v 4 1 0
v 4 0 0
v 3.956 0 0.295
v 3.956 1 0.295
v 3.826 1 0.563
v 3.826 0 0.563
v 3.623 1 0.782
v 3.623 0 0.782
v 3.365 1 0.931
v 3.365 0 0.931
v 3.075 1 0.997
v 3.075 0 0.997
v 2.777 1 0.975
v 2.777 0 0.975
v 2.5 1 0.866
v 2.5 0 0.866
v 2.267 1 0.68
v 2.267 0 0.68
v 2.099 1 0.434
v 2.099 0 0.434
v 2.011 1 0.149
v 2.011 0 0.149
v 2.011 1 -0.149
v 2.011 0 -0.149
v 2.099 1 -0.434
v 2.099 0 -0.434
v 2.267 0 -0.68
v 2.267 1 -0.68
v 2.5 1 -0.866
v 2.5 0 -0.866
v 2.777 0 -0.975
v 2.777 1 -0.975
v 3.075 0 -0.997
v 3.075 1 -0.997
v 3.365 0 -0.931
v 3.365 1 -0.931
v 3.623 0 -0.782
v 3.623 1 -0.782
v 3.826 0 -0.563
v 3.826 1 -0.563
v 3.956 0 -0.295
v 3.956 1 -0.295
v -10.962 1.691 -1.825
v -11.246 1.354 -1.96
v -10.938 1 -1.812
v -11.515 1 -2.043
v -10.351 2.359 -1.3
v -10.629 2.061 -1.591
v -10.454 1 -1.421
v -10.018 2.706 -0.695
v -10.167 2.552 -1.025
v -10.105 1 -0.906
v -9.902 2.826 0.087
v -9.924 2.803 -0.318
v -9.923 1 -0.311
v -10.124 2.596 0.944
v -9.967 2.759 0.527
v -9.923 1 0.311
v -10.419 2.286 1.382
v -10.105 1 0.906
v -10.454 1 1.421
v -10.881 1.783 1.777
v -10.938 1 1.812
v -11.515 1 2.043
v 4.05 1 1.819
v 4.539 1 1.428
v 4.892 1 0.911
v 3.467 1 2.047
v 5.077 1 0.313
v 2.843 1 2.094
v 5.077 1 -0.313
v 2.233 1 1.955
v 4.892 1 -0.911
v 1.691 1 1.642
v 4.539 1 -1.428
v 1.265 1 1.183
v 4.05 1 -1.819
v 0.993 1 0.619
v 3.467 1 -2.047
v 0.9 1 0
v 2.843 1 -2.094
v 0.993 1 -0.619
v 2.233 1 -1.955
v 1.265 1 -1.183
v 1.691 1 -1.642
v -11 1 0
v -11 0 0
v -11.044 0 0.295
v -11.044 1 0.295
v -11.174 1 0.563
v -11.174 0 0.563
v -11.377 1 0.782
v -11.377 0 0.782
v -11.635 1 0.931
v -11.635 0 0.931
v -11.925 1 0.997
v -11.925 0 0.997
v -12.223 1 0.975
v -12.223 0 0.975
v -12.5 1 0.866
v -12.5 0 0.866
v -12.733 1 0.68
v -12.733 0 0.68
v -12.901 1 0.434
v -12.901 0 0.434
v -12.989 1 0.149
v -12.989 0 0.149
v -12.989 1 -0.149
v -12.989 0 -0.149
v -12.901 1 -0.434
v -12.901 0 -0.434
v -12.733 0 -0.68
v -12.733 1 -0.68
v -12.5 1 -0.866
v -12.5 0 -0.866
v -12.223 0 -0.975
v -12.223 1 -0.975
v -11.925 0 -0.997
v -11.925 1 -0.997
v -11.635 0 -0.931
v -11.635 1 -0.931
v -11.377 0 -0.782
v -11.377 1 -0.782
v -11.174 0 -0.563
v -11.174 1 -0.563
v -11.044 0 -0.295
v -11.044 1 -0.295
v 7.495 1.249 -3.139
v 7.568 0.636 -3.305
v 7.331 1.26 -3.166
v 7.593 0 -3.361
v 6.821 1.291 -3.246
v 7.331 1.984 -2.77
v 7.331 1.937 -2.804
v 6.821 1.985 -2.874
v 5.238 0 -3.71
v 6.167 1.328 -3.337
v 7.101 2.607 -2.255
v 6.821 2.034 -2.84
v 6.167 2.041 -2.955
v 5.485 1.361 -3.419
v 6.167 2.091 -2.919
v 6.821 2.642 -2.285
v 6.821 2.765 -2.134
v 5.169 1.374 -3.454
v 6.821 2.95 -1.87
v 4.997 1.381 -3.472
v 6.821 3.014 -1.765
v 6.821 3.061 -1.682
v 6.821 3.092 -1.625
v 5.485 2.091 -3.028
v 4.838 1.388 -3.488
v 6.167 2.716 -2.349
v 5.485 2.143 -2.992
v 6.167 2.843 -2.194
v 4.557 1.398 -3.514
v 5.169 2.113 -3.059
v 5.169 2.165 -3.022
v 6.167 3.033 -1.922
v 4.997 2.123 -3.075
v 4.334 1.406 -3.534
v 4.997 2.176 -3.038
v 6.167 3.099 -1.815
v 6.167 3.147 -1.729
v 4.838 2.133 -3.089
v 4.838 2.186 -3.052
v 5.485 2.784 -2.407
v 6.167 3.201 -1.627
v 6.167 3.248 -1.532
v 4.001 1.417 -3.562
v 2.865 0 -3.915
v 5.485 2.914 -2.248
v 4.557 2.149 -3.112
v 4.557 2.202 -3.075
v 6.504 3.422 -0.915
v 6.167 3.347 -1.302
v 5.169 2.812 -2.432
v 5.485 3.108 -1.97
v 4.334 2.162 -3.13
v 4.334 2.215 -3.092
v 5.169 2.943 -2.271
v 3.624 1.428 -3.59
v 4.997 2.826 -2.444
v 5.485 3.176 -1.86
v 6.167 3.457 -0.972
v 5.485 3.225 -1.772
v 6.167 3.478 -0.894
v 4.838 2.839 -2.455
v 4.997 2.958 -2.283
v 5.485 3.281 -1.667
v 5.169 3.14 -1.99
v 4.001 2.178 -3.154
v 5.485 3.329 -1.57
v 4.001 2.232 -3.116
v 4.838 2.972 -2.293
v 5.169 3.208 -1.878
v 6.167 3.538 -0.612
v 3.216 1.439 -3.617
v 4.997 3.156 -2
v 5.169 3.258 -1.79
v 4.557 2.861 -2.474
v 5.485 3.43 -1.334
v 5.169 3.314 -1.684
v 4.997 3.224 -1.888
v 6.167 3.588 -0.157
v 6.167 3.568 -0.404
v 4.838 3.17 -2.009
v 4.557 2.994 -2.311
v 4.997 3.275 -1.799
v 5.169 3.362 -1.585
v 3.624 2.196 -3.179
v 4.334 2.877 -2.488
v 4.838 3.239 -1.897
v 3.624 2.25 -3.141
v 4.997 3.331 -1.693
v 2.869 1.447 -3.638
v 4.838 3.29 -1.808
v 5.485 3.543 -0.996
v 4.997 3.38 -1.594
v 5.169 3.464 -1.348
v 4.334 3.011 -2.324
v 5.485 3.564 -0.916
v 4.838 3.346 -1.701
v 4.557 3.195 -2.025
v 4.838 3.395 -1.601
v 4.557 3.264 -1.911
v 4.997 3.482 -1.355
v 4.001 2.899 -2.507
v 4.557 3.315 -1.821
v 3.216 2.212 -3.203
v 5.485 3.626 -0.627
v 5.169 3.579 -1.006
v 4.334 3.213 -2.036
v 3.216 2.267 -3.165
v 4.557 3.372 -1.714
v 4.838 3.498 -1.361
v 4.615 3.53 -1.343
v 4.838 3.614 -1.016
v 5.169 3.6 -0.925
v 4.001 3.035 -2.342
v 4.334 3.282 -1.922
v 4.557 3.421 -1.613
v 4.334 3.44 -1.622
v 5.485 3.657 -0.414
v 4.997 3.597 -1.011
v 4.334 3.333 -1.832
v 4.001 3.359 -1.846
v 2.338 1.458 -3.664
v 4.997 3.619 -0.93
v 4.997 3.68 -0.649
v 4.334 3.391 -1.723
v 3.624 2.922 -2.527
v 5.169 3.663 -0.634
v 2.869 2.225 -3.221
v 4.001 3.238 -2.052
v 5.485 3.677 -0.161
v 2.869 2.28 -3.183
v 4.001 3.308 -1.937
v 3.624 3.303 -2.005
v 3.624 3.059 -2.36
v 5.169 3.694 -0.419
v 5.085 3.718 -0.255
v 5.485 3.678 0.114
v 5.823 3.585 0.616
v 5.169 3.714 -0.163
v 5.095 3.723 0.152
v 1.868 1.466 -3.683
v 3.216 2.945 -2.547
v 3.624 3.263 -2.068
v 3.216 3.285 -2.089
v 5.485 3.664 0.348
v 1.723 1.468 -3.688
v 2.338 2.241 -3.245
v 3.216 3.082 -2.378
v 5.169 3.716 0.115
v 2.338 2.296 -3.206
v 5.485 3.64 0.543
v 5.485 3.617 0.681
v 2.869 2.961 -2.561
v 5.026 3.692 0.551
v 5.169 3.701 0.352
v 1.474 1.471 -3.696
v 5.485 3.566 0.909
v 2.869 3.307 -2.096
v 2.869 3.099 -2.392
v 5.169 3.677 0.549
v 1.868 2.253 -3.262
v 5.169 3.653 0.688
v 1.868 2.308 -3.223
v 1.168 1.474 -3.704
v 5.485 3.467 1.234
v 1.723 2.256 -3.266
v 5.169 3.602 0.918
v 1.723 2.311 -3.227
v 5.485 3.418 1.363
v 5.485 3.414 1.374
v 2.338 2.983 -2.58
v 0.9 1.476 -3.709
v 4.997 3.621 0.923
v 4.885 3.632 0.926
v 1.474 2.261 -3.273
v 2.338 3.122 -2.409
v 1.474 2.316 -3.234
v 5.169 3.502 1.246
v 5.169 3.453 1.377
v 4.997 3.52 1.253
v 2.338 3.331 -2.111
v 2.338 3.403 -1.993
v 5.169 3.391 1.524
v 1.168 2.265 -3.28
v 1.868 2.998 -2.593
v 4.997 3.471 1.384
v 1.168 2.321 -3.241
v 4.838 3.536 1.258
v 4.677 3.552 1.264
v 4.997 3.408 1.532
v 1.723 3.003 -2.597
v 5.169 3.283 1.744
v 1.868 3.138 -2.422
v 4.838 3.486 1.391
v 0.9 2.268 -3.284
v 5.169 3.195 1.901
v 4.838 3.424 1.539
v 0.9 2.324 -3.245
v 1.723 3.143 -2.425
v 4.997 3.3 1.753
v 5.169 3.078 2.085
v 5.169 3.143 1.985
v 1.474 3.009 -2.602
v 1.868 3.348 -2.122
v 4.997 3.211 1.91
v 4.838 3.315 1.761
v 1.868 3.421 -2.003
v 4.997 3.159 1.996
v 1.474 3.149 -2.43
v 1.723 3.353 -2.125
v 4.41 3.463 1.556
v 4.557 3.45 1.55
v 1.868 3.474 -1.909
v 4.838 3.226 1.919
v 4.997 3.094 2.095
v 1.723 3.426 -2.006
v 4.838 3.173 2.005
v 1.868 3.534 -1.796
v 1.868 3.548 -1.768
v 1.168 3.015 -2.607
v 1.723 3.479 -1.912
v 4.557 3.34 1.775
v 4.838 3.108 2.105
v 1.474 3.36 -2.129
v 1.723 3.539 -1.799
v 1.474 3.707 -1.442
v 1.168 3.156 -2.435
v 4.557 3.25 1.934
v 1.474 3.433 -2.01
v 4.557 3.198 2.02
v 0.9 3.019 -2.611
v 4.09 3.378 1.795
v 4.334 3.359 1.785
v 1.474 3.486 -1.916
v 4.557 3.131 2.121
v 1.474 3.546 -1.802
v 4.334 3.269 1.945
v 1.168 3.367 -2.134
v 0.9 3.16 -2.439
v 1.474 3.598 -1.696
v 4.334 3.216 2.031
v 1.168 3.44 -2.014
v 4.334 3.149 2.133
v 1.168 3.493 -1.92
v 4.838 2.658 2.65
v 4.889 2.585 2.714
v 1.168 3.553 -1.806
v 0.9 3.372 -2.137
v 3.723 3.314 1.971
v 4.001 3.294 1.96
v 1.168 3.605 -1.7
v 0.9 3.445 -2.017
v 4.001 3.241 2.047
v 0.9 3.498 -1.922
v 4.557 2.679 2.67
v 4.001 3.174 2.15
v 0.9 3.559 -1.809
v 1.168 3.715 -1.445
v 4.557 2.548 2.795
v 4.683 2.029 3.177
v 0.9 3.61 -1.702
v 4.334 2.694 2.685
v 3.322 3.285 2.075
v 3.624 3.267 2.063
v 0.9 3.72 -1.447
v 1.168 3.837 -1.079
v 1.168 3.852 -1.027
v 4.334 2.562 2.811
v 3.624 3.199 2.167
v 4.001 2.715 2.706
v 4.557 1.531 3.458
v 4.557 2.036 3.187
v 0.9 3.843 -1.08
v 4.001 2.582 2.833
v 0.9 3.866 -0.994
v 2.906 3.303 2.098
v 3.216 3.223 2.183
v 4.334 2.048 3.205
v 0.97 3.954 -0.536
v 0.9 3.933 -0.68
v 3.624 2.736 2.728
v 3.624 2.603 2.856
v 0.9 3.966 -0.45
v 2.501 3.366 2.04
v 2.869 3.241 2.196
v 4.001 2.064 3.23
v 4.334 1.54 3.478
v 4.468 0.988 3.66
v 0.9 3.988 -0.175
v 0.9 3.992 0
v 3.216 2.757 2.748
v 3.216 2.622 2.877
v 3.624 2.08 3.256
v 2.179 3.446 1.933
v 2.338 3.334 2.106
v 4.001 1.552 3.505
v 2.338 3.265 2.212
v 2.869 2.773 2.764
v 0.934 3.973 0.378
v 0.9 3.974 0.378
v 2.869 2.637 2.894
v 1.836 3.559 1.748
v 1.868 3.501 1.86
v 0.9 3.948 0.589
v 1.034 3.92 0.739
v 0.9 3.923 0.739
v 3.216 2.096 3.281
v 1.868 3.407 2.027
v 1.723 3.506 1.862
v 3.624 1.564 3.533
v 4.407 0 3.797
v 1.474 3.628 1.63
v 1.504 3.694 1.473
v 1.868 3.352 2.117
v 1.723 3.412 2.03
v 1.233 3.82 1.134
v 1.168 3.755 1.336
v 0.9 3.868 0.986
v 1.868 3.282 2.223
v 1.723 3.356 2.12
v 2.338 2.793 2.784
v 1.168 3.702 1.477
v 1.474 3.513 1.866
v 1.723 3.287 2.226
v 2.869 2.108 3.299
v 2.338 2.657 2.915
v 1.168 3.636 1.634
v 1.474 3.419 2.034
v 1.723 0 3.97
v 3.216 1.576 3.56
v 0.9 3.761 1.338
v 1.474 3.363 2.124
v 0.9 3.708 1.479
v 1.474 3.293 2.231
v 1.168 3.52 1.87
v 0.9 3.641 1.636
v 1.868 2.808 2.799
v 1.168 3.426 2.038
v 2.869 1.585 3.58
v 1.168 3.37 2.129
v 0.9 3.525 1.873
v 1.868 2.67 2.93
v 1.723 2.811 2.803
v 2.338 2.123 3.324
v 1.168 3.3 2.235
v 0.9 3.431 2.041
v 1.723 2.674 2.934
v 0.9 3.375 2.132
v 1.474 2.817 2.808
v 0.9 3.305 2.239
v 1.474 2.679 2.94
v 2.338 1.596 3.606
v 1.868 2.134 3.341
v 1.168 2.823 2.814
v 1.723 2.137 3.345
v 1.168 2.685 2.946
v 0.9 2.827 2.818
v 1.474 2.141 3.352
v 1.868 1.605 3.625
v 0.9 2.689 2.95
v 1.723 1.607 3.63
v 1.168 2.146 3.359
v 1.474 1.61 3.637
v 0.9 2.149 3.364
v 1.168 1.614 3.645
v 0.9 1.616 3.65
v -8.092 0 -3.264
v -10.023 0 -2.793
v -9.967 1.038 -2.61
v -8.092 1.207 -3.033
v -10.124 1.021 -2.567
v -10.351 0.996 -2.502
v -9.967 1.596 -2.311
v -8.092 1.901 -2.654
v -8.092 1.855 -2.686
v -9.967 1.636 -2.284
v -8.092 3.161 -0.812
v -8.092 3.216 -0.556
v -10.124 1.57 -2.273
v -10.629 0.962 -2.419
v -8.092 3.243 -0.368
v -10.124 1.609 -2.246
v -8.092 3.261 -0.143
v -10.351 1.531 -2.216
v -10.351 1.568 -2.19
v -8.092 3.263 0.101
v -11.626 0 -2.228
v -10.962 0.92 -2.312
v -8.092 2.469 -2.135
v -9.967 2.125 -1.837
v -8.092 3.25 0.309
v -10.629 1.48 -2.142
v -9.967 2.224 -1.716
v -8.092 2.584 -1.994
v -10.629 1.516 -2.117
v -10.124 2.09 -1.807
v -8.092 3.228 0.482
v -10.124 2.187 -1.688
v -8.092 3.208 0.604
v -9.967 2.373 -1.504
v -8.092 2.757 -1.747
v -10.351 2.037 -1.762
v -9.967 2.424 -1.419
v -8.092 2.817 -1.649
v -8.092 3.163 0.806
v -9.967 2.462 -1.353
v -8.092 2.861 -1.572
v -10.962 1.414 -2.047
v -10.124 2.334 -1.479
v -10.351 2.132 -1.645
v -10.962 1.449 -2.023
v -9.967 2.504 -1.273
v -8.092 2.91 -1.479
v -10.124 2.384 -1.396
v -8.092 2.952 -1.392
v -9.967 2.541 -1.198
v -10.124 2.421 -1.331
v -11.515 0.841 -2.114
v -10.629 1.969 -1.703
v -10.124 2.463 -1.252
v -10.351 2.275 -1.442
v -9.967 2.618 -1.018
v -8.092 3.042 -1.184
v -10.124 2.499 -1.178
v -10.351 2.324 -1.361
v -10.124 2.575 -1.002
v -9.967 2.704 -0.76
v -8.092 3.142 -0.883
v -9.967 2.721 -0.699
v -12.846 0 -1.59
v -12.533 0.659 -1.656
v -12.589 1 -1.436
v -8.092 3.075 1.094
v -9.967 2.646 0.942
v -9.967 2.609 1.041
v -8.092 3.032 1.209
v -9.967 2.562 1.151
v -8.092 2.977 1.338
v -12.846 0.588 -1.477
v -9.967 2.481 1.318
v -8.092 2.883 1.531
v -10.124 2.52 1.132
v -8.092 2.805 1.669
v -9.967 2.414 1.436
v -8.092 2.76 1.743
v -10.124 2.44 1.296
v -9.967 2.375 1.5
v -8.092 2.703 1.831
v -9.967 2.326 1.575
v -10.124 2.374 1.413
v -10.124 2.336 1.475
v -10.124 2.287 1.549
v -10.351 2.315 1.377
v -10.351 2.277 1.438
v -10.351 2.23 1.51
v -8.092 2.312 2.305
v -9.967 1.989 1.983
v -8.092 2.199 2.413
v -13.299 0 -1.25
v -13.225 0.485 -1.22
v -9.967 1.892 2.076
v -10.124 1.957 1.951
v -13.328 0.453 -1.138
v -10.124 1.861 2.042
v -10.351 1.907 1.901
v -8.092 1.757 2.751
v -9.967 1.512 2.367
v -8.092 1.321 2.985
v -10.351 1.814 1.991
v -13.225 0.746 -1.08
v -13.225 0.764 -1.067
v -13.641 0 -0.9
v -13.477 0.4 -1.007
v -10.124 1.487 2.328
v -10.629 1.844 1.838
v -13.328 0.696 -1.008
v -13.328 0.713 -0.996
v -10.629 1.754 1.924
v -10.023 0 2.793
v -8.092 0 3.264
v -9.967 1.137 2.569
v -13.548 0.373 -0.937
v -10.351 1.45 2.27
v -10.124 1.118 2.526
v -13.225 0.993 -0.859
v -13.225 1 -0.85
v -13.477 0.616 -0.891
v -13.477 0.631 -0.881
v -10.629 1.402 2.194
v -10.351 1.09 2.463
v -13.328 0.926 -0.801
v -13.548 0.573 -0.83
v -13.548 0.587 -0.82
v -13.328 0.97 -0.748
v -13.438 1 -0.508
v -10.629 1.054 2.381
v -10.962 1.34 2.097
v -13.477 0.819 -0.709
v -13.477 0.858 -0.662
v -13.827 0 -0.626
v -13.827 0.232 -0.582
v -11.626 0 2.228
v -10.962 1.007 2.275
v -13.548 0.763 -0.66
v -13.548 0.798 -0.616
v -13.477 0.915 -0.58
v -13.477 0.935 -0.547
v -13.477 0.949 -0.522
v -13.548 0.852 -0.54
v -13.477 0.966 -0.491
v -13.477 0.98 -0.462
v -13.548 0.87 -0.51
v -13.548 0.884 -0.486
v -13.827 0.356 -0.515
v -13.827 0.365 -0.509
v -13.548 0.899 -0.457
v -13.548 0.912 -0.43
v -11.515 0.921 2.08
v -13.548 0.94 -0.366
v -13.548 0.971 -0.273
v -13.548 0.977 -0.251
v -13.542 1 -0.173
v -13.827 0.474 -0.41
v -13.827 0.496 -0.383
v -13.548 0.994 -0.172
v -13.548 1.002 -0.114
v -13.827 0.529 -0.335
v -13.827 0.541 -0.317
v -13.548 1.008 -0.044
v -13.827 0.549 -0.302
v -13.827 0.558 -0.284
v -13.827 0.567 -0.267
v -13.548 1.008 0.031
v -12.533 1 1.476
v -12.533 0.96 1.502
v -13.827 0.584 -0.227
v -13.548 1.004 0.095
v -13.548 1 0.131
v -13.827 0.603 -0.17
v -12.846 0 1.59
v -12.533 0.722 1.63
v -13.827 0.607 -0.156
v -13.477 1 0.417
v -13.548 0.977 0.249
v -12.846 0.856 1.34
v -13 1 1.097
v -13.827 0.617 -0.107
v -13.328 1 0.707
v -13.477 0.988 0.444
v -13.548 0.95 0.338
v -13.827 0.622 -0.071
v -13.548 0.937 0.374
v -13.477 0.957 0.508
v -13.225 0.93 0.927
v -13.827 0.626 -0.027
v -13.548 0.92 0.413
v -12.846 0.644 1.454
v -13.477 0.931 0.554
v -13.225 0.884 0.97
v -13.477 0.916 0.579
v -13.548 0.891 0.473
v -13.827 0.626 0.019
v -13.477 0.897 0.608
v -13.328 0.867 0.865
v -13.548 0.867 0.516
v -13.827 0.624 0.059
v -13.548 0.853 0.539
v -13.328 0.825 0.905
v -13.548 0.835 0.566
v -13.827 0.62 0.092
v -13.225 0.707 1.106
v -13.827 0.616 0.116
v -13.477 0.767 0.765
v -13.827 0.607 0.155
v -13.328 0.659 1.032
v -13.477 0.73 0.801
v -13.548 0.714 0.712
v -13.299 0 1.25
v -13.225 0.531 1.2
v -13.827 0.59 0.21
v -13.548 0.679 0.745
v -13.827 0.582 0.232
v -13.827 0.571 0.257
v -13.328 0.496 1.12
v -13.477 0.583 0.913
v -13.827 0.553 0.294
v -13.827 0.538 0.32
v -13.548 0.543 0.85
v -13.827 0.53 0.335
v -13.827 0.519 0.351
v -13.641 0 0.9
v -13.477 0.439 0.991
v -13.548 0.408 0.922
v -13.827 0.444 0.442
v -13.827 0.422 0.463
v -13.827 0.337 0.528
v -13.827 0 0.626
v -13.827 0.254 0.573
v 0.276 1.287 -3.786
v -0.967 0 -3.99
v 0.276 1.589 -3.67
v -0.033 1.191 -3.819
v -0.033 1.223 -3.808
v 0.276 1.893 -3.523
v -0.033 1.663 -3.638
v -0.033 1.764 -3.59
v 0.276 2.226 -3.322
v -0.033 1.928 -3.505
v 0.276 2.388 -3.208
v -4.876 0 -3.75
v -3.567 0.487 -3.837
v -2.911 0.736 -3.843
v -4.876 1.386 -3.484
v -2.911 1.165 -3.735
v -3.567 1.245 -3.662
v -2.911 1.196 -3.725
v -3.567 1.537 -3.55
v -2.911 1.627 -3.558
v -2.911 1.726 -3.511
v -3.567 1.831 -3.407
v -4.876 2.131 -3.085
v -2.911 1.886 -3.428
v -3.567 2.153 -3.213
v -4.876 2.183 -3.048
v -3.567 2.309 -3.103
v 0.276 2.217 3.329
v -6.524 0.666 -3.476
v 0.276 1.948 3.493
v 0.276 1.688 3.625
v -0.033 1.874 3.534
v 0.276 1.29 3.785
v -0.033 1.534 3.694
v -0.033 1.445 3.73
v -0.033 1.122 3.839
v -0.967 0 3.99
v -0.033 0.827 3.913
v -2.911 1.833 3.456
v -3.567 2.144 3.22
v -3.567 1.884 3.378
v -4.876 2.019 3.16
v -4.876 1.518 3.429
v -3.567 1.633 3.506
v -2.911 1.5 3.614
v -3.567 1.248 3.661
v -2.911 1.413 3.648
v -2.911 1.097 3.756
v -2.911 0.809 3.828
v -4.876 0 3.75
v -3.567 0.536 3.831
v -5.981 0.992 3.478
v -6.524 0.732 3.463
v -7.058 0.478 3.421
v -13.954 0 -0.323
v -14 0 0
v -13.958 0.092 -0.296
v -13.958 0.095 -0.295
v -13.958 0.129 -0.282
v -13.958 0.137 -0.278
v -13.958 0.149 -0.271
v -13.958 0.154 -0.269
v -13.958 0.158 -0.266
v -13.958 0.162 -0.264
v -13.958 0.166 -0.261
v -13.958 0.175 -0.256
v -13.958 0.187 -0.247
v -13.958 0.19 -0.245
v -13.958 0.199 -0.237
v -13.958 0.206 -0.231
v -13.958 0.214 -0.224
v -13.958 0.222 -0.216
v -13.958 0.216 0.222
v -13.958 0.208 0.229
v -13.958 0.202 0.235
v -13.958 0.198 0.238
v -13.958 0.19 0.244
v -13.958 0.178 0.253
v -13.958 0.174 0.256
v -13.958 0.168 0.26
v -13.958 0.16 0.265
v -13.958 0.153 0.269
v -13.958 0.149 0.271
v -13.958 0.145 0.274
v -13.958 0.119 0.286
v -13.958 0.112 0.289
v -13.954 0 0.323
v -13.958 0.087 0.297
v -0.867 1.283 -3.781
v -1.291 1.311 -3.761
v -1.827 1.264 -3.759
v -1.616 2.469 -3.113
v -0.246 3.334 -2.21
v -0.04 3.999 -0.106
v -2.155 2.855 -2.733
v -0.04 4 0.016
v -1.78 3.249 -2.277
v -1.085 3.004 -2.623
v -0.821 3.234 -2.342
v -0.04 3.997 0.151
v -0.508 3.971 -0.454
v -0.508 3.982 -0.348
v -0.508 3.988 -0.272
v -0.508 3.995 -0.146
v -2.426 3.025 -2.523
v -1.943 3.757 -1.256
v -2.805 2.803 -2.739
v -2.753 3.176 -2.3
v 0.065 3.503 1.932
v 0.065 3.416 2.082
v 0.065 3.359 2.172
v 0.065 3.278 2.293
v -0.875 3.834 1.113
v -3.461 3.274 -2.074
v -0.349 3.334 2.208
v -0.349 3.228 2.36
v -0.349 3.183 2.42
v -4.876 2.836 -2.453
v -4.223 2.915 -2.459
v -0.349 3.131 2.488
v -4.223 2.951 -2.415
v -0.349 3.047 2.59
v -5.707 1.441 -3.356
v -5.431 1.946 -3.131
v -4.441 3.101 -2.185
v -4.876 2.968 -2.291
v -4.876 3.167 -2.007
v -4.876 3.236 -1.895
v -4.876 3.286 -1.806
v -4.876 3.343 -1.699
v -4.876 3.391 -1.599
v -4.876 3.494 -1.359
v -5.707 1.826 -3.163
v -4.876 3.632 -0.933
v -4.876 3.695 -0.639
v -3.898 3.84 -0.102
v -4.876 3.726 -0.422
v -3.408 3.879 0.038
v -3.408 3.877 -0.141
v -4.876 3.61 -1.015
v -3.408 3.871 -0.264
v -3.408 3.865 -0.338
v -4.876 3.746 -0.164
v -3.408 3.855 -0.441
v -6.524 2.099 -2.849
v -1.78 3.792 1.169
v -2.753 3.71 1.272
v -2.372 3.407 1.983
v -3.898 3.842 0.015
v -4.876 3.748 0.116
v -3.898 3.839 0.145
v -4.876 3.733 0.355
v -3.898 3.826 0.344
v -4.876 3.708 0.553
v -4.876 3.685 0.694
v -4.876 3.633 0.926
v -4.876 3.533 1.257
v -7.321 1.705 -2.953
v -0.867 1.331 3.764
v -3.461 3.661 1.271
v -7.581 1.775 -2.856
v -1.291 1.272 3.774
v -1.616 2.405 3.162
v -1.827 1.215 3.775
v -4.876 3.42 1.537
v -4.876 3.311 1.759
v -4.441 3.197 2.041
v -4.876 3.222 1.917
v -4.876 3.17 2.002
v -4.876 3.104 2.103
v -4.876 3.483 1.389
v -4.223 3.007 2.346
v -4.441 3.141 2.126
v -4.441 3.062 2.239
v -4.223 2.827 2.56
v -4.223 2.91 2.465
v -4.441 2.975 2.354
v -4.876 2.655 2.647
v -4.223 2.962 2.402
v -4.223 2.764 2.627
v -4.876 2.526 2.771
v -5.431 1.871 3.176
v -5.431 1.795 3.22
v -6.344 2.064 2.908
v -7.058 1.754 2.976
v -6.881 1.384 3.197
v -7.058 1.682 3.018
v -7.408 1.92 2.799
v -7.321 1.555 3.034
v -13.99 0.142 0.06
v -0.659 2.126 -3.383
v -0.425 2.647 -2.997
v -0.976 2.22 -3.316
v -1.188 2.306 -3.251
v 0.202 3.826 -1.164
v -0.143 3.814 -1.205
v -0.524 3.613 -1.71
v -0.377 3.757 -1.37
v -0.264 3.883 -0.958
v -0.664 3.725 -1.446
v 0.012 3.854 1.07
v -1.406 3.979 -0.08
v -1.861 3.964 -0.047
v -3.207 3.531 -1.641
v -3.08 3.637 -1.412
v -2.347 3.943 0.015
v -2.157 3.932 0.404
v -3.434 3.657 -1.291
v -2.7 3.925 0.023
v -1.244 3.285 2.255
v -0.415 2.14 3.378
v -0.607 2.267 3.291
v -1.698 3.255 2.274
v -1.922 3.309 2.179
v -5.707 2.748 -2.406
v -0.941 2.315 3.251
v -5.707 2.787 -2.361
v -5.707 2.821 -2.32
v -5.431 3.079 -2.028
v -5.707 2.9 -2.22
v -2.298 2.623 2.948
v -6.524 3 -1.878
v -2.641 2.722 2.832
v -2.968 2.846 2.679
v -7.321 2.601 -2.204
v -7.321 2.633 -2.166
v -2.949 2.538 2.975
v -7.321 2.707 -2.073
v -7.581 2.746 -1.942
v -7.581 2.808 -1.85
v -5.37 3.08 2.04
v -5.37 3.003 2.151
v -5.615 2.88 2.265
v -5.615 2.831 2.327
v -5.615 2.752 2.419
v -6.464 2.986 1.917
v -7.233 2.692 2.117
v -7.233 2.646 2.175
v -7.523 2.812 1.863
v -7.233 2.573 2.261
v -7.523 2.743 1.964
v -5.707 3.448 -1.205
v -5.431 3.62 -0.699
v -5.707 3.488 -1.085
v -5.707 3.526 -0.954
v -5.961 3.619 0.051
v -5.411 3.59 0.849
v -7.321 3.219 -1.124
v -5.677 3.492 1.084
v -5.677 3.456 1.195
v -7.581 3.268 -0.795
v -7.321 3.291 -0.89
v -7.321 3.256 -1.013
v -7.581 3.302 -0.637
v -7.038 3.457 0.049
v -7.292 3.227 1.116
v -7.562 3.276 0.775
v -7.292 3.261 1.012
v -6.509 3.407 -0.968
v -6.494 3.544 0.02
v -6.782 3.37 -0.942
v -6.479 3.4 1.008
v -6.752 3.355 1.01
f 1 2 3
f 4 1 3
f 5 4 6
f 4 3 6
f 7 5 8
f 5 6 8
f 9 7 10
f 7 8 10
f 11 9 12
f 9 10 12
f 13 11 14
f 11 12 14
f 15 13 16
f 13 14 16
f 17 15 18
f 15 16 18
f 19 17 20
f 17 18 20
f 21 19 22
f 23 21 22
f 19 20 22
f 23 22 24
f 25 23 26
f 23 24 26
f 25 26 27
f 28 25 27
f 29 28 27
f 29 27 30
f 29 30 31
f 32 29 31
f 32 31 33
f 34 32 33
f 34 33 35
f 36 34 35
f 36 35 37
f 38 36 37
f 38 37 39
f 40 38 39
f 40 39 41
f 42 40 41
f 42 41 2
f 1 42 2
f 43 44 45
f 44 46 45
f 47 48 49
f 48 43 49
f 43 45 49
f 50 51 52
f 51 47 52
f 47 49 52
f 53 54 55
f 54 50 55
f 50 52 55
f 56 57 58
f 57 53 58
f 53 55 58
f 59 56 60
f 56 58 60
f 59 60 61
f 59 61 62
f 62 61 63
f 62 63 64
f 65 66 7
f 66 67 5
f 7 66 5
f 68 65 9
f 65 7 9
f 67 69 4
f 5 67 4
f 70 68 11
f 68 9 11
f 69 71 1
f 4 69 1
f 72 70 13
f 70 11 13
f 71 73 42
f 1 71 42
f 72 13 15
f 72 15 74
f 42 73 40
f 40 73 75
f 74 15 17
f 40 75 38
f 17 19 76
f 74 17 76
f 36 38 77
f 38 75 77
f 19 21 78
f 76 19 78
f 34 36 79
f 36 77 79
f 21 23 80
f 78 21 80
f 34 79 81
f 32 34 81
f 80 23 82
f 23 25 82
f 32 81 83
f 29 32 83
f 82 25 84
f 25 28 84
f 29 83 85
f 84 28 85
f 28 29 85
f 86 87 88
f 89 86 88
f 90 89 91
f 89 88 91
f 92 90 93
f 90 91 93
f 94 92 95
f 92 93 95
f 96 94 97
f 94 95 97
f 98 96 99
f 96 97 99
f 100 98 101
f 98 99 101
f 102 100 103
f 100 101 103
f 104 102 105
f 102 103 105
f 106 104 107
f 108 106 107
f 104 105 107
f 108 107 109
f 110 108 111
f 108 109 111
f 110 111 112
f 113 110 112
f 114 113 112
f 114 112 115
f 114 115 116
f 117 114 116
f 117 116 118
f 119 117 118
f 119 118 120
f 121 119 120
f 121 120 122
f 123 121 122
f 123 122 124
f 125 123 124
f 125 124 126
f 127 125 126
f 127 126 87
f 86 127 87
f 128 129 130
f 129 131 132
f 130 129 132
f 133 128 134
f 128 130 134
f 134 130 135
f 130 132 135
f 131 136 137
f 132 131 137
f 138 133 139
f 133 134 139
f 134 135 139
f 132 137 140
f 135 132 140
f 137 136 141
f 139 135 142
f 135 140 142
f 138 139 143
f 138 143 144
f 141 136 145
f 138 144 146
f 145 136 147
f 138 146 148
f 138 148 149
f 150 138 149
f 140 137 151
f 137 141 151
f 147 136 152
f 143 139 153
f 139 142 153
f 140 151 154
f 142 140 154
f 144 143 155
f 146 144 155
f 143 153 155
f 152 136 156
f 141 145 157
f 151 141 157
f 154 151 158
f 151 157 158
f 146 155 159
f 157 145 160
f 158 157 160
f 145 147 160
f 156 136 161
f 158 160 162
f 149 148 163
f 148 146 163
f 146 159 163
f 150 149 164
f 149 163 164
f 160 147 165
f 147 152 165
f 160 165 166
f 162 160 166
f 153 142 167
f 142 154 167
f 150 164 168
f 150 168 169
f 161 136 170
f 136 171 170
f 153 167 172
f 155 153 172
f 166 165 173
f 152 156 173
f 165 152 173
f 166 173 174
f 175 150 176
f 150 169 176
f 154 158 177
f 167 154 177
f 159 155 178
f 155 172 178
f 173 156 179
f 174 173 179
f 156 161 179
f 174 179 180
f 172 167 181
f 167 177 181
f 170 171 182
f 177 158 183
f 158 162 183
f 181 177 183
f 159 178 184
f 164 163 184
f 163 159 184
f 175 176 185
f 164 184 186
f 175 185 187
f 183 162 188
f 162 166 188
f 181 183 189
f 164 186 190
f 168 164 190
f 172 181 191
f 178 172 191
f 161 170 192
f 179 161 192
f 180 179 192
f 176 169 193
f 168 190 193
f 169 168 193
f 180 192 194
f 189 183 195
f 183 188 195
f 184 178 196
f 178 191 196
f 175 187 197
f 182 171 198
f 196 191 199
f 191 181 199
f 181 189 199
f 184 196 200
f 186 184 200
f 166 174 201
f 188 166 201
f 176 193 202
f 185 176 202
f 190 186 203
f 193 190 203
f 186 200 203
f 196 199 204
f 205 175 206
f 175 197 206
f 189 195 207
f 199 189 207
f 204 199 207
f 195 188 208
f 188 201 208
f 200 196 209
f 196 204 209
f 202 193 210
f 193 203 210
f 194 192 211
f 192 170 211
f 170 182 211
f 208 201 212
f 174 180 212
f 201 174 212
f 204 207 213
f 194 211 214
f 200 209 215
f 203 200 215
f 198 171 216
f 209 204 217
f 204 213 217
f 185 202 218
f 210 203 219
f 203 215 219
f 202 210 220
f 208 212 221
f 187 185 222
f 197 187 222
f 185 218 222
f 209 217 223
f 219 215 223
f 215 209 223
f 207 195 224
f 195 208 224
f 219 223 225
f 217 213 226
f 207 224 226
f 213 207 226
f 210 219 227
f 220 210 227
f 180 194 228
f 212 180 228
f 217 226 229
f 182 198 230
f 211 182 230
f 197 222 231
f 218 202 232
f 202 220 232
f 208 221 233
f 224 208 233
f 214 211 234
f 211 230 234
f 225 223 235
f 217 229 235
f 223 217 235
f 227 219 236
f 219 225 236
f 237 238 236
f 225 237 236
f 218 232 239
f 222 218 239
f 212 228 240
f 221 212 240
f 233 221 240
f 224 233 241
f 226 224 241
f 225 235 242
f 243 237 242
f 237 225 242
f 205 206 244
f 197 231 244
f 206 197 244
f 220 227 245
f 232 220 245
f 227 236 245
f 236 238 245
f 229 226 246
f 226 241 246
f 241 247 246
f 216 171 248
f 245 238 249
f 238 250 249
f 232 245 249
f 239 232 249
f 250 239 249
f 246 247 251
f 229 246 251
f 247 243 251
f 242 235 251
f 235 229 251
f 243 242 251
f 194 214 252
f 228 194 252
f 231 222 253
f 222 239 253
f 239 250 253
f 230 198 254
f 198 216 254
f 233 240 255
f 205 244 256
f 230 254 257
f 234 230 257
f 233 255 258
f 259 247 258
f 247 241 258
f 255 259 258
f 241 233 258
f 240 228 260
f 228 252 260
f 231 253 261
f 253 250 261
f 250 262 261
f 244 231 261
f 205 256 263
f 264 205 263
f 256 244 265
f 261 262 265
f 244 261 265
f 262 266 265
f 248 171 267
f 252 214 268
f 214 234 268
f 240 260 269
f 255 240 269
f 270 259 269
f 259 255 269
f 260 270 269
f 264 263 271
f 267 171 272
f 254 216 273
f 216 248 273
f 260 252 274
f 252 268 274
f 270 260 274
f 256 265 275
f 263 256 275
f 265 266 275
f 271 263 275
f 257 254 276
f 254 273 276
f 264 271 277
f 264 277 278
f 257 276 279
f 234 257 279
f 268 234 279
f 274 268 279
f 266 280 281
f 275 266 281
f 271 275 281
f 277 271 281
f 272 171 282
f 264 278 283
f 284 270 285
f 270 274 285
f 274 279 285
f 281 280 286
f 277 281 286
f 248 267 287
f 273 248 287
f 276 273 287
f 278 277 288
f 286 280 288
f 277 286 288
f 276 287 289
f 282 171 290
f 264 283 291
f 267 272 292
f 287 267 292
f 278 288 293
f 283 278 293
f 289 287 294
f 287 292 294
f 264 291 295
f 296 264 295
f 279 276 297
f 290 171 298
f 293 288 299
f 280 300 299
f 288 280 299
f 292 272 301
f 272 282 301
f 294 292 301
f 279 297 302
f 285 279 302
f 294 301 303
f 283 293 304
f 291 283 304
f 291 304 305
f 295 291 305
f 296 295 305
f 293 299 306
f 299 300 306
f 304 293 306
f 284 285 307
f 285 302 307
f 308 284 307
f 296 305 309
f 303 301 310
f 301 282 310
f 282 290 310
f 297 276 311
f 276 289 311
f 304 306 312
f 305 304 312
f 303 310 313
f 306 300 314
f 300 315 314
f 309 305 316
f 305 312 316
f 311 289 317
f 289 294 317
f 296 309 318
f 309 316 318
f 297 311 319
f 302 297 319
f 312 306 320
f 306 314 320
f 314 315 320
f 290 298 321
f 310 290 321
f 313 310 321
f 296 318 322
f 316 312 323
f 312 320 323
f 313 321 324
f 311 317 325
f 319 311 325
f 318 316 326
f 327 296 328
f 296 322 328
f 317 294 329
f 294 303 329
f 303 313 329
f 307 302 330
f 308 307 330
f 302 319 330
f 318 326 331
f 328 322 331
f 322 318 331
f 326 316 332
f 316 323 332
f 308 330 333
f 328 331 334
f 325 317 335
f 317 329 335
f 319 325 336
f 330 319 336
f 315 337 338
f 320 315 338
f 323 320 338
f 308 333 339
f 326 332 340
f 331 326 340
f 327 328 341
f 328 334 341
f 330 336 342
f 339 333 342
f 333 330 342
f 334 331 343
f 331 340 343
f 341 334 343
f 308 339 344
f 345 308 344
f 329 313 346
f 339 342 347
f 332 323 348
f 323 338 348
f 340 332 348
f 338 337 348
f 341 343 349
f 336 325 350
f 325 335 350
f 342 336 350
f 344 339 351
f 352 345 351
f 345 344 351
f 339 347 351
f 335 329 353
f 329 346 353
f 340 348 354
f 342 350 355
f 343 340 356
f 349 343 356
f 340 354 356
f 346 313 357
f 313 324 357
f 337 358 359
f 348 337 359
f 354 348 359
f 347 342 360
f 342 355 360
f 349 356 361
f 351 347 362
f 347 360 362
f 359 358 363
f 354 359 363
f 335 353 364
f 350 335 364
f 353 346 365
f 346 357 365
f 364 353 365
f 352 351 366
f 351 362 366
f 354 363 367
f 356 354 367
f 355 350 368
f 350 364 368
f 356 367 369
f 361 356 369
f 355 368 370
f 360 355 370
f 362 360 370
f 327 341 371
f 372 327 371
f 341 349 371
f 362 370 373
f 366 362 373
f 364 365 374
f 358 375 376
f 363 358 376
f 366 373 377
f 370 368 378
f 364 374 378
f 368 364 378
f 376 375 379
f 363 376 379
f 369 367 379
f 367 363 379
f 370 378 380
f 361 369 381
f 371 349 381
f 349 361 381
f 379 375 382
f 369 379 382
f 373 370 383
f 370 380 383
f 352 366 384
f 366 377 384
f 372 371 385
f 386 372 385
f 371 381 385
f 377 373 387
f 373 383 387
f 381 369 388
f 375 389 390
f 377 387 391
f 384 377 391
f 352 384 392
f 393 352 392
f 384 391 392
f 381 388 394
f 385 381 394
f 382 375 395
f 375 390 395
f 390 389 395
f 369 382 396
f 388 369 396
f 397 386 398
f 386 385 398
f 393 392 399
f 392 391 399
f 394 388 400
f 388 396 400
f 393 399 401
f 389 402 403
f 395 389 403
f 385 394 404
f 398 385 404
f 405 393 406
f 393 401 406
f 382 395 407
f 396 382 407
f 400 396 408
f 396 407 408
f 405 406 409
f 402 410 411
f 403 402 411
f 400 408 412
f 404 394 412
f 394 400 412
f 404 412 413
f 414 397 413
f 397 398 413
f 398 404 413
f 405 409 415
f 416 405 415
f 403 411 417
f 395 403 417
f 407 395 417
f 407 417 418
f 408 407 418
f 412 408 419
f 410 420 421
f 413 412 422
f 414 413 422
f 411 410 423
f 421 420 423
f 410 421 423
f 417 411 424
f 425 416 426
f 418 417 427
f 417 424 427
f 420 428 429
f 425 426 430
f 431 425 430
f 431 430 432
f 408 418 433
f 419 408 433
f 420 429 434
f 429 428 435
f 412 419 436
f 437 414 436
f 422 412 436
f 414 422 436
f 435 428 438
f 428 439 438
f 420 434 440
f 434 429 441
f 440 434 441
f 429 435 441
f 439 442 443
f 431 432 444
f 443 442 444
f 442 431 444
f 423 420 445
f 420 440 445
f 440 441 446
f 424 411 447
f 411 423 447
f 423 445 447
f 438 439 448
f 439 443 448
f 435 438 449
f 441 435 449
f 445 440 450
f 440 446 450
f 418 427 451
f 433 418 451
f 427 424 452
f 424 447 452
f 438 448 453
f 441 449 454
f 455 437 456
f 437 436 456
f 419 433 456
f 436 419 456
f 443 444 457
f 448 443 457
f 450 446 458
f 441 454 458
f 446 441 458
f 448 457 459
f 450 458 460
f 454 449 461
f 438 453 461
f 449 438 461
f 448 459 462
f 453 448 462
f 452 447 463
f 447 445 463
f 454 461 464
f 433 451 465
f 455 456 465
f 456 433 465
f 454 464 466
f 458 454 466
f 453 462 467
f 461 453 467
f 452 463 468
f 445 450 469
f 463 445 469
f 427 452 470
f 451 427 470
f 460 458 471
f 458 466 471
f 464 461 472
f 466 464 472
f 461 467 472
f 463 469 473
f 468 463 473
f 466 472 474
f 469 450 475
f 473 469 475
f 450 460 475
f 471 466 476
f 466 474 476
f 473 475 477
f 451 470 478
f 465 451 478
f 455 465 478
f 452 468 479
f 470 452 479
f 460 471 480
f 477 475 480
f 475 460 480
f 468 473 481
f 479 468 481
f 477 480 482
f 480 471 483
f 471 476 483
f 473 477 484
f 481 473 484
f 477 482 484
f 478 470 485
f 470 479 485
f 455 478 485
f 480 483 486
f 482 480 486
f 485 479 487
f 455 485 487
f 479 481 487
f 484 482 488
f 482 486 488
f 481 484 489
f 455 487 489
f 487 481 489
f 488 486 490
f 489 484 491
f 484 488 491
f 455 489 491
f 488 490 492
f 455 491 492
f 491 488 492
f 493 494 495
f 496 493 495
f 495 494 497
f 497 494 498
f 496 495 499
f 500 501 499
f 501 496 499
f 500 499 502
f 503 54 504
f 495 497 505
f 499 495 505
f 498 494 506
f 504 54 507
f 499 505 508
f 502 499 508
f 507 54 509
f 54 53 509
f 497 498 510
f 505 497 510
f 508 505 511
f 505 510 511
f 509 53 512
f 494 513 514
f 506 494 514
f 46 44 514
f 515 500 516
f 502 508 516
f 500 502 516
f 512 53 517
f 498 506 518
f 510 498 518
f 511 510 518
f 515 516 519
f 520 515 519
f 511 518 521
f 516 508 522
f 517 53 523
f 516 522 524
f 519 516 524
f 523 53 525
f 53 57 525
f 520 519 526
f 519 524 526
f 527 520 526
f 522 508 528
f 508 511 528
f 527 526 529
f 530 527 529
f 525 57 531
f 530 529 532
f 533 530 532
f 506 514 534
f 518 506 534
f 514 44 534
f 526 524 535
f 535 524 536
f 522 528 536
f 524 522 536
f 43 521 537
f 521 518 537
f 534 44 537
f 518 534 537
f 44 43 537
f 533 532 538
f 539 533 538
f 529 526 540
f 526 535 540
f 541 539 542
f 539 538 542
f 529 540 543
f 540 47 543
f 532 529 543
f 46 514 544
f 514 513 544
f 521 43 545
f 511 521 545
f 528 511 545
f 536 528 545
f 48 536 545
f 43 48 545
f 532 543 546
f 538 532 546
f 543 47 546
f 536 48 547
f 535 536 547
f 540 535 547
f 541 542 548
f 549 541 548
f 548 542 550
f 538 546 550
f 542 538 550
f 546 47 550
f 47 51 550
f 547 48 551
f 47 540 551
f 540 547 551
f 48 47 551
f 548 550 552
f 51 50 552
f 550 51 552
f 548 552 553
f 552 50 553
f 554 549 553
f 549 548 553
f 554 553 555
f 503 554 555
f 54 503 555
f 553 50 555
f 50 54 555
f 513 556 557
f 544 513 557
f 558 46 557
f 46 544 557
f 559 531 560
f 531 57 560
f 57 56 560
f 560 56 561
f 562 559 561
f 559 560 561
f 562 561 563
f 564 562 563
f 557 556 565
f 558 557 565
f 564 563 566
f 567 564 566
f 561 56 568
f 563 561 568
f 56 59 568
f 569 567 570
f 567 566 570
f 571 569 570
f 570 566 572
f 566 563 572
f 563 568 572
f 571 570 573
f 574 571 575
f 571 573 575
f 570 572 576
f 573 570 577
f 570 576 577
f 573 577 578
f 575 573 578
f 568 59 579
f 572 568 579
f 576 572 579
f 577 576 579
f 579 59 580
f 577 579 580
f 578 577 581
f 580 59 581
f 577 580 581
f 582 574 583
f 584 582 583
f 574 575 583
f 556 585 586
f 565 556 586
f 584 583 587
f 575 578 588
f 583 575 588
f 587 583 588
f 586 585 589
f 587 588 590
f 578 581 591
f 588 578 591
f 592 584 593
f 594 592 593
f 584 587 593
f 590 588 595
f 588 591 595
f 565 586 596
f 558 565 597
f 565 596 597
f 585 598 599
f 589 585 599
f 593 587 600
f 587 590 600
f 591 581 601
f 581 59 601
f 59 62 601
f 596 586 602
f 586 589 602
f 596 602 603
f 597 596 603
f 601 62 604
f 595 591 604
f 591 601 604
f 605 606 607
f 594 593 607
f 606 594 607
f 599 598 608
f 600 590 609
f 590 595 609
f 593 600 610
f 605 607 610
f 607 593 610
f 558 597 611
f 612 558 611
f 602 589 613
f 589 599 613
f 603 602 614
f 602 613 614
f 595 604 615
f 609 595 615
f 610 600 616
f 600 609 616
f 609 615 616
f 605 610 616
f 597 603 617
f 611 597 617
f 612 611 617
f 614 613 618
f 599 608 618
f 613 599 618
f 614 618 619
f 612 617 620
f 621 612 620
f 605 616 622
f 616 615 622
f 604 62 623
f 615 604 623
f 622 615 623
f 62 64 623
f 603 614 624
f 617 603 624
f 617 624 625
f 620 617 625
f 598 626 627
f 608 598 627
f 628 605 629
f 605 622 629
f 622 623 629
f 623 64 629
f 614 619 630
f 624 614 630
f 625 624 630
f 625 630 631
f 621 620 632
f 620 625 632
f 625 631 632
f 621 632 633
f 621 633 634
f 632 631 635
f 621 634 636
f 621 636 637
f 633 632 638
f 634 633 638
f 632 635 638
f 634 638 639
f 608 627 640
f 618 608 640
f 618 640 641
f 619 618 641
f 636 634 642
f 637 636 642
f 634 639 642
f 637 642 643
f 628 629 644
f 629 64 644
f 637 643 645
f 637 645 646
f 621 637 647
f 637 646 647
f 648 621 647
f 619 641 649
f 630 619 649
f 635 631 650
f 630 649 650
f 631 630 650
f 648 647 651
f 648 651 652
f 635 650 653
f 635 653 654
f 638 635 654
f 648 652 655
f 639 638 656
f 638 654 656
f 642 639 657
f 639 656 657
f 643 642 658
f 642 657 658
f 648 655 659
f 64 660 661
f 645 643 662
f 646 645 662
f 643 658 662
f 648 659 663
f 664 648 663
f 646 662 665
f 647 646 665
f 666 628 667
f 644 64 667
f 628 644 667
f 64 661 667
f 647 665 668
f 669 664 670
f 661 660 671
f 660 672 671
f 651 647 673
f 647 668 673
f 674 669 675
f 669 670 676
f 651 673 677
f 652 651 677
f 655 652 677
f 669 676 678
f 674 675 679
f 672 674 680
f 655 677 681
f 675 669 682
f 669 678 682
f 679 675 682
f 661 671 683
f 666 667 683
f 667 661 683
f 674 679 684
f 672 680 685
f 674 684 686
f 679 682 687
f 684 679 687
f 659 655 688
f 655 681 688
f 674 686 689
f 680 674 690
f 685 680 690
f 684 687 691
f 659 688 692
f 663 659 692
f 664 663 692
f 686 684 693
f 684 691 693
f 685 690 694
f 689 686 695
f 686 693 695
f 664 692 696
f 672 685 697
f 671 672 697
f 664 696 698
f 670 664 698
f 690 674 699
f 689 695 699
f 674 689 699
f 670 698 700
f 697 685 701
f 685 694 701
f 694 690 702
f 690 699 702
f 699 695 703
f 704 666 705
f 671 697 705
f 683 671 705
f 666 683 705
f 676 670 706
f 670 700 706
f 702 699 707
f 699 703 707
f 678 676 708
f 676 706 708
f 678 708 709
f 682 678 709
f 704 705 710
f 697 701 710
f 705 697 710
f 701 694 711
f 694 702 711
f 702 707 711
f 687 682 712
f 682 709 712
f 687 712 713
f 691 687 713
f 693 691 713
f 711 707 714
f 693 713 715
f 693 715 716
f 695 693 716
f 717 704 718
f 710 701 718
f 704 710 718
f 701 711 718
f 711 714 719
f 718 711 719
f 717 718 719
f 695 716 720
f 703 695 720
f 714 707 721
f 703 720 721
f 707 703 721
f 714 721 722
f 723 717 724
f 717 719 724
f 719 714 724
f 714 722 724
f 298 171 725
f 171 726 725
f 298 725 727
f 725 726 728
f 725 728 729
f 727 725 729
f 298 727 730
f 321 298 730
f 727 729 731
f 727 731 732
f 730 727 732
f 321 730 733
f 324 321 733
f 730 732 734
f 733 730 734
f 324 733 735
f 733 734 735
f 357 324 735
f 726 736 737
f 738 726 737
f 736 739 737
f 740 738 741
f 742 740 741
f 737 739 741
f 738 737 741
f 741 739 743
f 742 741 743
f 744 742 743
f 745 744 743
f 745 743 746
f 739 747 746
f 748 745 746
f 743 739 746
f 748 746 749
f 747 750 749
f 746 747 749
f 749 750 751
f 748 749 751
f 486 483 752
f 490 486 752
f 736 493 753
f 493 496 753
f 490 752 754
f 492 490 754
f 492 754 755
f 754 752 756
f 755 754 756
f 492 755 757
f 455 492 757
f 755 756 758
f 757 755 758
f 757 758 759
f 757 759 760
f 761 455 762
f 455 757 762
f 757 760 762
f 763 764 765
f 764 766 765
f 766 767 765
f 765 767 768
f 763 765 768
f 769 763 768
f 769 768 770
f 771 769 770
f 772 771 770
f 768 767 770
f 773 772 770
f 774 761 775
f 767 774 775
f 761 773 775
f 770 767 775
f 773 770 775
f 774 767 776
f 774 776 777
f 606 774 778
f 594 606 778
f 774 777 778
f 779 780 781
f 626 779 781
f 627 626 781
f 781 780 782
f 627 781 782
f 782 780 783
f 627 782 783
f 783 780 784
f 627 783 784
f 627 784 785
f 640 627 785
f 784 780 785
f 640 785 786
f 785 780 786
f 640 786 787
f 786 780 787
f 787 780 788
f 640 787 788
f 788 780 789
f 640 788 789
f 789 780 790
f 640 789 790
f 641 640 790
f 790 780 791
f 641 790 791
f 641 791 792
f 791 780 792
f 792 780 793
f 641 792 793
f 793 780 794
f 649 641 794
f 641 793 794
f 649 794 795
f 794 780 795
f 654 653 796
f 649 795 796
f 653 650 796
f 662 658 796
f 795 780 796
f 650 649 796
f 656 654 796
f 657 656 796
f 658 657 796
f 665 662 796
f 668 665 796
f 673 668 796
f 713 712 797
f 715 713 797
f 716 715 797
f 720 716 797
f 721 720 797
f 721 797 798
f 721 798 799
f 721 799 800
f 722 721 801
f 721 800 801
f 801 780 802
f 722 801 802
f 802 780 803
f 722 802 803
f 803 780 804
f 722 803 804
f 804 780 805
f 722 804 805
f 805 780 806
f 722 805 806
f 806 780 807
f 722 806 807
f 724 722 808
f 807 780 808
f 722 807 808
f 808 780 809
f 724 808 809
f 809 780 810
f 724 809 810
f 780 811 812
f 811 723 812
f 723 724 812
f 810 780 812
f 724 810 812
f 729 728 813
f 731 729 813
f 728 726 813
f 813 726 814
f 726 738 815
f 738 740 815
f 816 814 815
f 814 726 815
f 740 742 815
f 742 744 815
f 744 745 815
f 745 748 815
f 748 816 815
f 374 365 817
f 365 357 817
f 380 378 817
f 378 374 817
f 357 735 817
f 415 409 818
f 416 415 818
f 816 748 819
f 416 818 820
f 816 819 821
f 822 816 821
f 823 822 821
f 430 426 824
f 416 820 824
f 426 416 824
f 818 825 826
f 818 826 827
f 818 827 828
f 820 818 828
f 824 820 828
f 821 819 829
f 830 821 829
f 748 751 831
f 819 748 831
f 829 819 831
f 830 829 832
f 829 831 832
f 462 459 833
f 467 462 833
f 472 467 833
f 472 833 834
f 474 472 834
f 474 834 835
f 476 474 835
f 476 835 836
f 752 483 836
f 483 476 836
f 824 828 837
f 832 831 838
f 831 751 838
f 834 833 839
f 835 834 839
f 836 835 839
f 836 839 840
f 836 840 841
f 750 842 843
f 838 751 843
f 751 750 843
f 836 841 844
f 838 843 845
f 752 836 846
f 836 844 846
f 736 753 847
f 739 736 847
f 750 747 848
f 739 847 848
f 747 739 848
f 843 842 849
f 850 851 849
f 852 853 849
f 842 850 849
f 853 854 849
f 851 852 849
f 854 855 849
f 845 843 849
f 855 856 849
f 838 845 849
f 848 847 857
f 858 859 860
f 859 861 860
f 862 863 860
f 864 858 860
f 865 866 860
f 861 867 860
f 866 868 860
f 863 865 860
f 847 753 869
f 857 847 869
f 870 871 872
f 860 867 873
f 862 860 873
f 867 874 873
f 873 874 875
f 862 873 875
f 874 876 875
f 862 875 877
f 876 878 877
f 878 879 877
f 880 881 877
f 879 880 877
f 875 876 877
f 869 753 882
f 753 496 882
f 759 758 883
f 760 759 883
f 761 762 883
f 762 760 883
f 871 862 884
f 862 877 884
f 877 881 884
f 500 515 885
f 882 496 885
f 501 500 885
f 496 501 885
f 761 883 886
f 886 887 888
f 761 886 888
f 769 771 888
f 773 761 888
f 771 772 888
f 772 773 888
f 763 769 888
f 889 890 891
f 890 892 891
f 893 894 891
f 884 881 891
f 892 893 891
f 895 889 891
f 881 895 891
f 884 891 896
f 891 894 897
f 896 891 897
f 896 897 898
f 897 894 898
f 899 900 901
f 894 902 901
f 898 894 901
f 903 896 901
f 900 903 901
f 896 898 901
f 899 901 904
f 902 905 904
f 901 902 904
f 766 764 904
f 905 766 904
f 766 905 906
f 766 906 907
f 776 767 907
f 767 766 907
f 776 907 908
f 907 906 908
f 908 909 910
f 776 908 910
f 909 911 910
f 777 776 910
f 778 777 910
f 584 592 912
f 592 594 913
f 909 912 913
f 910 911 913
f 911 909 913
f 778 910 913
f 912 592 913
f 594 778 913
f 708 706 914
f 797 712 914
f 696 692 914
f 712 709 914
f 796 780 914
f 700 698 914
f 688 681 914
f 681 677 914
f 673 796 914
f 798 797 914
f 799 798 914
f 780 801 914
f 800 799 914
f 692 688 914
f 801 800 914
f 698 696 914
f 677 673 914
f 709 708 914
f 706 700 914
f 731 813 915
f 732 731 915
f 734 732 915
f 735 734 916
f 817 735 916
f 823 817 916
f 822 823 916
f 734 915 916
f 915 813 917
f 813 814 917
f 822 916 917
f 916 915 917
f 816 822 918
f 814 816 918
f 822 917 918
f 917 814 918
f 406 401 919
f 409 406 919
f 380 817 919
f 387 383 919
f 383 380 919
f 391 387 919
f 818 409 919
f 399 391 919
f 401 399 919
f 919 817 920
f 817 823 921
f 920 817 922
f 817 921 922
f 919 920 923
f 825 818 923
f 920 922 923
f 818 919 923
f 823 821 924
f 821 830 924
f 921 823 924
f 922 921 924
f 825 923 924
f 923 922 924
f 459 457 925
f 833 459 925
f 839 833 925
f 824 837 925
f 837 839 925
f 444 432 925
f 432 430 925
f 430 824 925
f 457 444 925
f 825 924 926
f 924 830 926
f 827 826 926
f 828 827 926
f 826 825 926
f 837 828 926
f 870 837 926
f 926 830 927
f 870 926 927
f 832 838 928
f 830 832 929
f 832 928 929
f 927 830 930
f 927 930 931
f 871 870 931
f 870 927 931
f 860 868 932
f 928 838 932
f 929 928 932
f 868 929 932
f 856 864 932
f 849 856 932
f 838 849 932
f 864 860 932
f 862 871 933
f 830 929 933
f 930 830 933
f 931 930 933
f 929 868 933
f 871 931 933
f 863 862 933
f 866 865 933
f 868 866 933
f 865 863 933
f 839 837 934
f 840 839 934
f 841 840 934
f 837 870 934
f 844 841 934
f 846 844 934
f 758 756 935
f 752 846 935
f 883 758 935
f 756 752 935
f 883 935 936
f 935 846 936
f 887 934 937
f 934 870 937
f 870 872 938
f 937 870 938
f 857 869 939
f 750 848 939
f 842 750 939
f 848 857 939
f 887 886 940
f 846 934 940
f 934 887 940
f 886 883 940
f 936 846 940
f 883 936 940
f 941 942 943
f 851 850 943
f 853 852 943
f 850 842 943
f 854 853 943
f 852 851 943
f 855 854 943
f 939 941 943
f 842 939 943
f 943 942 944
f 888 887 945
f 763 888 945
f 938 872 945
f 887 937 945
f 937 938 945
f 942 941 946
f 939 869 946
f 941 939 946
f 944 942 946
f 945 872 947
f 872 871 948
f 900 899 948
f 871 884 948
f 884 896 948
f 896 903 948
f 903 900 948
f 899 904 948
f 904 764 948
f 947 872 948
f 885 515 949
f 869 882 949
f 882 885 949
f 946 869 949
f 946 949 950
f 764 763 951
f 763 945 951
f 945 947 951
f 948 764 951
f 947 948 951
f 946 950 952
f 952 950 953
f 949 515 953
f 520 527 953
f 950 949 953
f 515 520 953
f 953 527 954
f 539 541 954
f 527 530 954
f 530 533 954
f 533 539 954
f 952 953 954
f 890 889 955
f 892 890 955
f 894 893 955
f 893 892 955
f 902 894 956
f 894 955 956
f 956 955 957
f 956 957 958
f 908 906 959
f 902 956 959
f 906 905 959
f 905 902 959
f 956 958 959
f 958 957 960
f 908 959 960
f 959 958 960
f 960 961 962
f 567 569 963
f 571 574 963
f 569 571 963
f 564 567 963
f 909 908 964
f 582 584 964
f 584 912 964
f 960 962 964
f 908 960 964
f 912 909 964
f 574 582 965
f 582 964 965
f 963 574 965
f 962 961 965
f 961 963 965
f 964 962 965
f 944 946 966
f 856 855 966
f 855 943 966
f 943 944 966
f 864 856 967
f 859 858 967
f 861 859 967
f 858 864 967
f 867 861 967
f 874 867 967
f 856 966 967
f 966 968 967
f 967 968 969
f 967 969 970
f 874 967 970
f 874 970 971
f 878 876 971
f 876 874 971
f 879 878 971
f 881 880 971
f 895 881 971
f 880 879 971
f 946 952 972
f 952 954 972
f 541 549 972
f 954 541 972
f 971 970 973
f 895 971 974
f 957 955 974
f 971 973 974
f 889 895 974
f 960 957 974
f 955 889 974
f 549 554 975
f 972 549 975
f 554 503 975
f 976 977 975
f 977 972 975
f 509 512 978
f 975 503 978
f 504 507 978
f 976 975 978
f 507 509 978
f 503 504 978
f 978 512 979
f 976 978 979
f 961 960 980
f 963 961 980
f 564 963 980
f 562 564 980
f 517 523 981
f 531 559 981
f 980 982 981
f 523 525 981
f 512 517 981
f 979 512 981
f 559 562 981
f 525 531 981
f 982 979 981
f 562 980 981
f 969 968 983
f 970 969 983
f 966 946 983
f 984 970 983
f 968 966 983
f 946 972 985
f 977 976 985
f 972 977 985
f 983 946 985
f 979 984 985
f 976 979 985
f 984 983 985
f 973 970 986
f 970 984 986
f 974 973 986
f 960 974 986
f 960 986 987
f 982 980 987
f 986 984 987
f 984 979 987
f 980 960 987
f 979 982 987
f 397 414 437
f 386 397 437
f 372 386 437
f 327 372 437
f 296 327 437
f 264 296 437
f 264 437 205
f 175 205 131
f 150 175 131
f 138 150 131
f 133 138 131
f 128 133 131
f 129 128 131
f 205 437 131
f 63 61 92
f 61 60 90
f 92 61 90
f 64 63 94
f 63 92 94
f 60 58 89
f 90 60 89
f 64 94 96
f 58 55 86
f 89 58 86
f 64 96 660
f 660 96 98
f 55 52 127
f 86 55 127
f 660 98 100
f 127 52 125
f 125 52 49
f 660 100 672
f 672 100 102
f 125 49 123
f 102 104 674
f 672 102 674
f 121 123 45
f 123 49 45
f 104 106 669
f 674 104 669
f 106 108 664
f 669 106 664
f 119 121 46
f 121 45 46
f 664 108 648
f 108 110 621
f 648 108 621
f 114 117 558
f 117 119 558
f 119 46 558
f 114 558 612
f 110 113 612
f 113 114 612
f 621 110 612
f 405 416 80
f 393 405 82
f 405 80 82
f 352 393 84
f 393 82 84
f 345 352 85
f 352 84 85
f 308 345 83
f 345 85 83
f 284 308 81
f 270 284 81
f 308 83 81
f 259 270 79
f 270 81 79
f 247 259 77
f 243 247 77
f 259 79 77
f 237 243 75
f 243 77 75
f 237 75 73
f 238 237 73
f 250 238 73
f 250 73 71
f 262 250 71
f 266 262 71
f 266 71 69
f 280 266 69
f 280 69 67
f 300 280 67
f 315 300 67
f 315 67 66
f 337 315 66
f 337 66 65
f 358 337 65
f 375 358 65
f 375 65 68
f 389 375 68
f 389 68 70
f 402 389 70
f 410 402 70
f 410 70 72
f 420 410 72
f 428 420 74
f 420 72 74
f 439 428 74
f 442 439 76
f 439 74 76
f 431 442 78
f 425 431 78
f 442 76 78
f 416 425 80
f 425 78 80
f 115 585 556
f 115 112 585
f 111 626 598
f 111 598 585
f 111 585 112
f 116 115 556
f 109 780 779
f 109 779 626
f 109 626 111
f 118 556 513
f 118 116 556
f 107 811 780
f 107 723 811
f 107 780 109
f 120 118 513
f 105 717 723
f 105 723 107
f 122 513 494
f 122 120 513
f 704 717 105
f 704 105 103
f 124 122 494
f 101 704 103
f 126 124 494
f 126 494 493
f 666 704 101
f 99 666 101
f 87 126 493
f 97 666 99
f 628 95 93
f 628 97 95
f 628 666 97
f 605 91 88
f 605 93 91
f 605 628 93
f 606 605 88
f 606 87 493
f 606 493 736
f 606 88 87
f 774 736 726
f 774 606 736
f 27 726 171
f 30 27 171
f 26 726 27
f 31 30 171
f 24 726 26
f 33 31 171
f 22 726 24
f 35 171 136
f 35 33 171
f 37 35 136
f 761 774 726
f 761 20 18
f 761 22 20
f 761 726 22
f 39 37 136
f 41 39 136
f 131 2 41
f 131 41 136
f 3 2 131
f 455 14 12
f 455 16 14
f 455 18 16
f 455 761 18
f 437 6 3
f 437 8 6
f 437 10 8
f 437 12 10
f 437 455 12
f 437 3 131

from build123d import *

# Parameters (mm, degrees)
SKETCH2_W               = 50.634745493
SKETCH2_H               = 13.07277583
CUT_EXTRUDE1_DEPTH      = 5.0000001
CUT_EXTRUDE1_DEPTH_BACK = 5.0000001
SKETCH3_R               = 1
CUT_EXTRUDE2_DEPTH      = 5.0000001
SKETCH4_R               = 2.1
CUT_EXTRUDE3_DEPTH      = 4.0000001
CUT_EXTRUDE5_DEPTH      = 5.0000001


with BuildPart() as part:
    # Sketch1 → Revolve1 (revolve)
    with BuildSketch(Plane.XY):
        with BuildLine():
            Line((-14, 0), (14, 0))
            add(Edge.make_bspline(
                [(14, 0), (14, 4), (0, 4), (-14, 4), (-14, 0)],
                knots=[0, 0, 0, 1.570796327, 1.570796327, 3.141592654, 3.141592654, 3.141592654], degree=2, weights=[1, 0.707106781, 1, 0.707106781, 1]))
        make_face()
    revolve(axis=Axis((-14, 0, 0), (1, 0, 0)))

    # Sketch2 → Cut-Extrude1 (cut, two sides)
    with BuildSketch(Plane.XY) as cut_extrude1_sk:
        with Locations((-1.598405816, -6.536387915)):
            Rectangle(SKETCH2_W, SKETCH2_H)
    extrude(amount=CUT_EXTRUDE1_DEPTH, mode=Mode.SUBTRACT)
    extrude(cut_extrude1_sk.sketch, amount=-CUT_EXTRUDE1_DEPTH_BACK, mode=Mode.SUBTRACT)

    # Sketch3 → Cut-Extrude2 (cut, through all)
    with BuildSketch(Plane.XZ):
        with Locations((-12, 0)):
            Circle(SKETCH3_R)
        with Locations((3, 0)):
            Circle(SKETCH3_R)
    extrude(amount=-CUT_EXTRUDE2_DEPTH, mode=Mode.SUBTRACT)

    # Sketch4 → Cut-Extrude3 (cut, through all)
    with BuildSketch(Plane(origin=(0, 1, 0), x_dir=(-1, 0, 0), z_dir=(0, -1, 0))):
        with Locations((12, 0)):
            Circle(SKETCH4_R)
        with Locations((-3, 0)):
            Circle(SKETCH4_R)
    extrude(amount=-CUT_EXTRUDE3_DEPTH, mode=Mode.SUBTRACT)

    # Sketch6 → Cut-Extrude5 (cut, through all)
    with BuildSketch(Plane.XZ):
        with BuildLine():
            Line((4.406700976, 3.796679392), (7.593299024, -3.360537007))
            add(Edge.make_bspline(
                [(7.593299024, -3.360537007), (14, -2.178801768), (14, 0)],
                knots=[5.285654608, 5.285654608, 5.285654608, 6.283185307, 6.283185307, 6.283185307], degree=2, weights=[1, 0.878173816, 1]))
            add(Edge.make_bspline(
                [(14, 0), (14, 2.887726136), (4.406700976, 3.796679392)],
                knots=[0, 0, 0, 1.250587947, 1.250587947, 1.250587947], degree=2, weights=[1, 0.810791081, 1]))
        make_face()
    extrude(amount=-CUT_EXTRUDE5_DEPTH, mode=Mode.SUBTRACT)


solid = part.part
